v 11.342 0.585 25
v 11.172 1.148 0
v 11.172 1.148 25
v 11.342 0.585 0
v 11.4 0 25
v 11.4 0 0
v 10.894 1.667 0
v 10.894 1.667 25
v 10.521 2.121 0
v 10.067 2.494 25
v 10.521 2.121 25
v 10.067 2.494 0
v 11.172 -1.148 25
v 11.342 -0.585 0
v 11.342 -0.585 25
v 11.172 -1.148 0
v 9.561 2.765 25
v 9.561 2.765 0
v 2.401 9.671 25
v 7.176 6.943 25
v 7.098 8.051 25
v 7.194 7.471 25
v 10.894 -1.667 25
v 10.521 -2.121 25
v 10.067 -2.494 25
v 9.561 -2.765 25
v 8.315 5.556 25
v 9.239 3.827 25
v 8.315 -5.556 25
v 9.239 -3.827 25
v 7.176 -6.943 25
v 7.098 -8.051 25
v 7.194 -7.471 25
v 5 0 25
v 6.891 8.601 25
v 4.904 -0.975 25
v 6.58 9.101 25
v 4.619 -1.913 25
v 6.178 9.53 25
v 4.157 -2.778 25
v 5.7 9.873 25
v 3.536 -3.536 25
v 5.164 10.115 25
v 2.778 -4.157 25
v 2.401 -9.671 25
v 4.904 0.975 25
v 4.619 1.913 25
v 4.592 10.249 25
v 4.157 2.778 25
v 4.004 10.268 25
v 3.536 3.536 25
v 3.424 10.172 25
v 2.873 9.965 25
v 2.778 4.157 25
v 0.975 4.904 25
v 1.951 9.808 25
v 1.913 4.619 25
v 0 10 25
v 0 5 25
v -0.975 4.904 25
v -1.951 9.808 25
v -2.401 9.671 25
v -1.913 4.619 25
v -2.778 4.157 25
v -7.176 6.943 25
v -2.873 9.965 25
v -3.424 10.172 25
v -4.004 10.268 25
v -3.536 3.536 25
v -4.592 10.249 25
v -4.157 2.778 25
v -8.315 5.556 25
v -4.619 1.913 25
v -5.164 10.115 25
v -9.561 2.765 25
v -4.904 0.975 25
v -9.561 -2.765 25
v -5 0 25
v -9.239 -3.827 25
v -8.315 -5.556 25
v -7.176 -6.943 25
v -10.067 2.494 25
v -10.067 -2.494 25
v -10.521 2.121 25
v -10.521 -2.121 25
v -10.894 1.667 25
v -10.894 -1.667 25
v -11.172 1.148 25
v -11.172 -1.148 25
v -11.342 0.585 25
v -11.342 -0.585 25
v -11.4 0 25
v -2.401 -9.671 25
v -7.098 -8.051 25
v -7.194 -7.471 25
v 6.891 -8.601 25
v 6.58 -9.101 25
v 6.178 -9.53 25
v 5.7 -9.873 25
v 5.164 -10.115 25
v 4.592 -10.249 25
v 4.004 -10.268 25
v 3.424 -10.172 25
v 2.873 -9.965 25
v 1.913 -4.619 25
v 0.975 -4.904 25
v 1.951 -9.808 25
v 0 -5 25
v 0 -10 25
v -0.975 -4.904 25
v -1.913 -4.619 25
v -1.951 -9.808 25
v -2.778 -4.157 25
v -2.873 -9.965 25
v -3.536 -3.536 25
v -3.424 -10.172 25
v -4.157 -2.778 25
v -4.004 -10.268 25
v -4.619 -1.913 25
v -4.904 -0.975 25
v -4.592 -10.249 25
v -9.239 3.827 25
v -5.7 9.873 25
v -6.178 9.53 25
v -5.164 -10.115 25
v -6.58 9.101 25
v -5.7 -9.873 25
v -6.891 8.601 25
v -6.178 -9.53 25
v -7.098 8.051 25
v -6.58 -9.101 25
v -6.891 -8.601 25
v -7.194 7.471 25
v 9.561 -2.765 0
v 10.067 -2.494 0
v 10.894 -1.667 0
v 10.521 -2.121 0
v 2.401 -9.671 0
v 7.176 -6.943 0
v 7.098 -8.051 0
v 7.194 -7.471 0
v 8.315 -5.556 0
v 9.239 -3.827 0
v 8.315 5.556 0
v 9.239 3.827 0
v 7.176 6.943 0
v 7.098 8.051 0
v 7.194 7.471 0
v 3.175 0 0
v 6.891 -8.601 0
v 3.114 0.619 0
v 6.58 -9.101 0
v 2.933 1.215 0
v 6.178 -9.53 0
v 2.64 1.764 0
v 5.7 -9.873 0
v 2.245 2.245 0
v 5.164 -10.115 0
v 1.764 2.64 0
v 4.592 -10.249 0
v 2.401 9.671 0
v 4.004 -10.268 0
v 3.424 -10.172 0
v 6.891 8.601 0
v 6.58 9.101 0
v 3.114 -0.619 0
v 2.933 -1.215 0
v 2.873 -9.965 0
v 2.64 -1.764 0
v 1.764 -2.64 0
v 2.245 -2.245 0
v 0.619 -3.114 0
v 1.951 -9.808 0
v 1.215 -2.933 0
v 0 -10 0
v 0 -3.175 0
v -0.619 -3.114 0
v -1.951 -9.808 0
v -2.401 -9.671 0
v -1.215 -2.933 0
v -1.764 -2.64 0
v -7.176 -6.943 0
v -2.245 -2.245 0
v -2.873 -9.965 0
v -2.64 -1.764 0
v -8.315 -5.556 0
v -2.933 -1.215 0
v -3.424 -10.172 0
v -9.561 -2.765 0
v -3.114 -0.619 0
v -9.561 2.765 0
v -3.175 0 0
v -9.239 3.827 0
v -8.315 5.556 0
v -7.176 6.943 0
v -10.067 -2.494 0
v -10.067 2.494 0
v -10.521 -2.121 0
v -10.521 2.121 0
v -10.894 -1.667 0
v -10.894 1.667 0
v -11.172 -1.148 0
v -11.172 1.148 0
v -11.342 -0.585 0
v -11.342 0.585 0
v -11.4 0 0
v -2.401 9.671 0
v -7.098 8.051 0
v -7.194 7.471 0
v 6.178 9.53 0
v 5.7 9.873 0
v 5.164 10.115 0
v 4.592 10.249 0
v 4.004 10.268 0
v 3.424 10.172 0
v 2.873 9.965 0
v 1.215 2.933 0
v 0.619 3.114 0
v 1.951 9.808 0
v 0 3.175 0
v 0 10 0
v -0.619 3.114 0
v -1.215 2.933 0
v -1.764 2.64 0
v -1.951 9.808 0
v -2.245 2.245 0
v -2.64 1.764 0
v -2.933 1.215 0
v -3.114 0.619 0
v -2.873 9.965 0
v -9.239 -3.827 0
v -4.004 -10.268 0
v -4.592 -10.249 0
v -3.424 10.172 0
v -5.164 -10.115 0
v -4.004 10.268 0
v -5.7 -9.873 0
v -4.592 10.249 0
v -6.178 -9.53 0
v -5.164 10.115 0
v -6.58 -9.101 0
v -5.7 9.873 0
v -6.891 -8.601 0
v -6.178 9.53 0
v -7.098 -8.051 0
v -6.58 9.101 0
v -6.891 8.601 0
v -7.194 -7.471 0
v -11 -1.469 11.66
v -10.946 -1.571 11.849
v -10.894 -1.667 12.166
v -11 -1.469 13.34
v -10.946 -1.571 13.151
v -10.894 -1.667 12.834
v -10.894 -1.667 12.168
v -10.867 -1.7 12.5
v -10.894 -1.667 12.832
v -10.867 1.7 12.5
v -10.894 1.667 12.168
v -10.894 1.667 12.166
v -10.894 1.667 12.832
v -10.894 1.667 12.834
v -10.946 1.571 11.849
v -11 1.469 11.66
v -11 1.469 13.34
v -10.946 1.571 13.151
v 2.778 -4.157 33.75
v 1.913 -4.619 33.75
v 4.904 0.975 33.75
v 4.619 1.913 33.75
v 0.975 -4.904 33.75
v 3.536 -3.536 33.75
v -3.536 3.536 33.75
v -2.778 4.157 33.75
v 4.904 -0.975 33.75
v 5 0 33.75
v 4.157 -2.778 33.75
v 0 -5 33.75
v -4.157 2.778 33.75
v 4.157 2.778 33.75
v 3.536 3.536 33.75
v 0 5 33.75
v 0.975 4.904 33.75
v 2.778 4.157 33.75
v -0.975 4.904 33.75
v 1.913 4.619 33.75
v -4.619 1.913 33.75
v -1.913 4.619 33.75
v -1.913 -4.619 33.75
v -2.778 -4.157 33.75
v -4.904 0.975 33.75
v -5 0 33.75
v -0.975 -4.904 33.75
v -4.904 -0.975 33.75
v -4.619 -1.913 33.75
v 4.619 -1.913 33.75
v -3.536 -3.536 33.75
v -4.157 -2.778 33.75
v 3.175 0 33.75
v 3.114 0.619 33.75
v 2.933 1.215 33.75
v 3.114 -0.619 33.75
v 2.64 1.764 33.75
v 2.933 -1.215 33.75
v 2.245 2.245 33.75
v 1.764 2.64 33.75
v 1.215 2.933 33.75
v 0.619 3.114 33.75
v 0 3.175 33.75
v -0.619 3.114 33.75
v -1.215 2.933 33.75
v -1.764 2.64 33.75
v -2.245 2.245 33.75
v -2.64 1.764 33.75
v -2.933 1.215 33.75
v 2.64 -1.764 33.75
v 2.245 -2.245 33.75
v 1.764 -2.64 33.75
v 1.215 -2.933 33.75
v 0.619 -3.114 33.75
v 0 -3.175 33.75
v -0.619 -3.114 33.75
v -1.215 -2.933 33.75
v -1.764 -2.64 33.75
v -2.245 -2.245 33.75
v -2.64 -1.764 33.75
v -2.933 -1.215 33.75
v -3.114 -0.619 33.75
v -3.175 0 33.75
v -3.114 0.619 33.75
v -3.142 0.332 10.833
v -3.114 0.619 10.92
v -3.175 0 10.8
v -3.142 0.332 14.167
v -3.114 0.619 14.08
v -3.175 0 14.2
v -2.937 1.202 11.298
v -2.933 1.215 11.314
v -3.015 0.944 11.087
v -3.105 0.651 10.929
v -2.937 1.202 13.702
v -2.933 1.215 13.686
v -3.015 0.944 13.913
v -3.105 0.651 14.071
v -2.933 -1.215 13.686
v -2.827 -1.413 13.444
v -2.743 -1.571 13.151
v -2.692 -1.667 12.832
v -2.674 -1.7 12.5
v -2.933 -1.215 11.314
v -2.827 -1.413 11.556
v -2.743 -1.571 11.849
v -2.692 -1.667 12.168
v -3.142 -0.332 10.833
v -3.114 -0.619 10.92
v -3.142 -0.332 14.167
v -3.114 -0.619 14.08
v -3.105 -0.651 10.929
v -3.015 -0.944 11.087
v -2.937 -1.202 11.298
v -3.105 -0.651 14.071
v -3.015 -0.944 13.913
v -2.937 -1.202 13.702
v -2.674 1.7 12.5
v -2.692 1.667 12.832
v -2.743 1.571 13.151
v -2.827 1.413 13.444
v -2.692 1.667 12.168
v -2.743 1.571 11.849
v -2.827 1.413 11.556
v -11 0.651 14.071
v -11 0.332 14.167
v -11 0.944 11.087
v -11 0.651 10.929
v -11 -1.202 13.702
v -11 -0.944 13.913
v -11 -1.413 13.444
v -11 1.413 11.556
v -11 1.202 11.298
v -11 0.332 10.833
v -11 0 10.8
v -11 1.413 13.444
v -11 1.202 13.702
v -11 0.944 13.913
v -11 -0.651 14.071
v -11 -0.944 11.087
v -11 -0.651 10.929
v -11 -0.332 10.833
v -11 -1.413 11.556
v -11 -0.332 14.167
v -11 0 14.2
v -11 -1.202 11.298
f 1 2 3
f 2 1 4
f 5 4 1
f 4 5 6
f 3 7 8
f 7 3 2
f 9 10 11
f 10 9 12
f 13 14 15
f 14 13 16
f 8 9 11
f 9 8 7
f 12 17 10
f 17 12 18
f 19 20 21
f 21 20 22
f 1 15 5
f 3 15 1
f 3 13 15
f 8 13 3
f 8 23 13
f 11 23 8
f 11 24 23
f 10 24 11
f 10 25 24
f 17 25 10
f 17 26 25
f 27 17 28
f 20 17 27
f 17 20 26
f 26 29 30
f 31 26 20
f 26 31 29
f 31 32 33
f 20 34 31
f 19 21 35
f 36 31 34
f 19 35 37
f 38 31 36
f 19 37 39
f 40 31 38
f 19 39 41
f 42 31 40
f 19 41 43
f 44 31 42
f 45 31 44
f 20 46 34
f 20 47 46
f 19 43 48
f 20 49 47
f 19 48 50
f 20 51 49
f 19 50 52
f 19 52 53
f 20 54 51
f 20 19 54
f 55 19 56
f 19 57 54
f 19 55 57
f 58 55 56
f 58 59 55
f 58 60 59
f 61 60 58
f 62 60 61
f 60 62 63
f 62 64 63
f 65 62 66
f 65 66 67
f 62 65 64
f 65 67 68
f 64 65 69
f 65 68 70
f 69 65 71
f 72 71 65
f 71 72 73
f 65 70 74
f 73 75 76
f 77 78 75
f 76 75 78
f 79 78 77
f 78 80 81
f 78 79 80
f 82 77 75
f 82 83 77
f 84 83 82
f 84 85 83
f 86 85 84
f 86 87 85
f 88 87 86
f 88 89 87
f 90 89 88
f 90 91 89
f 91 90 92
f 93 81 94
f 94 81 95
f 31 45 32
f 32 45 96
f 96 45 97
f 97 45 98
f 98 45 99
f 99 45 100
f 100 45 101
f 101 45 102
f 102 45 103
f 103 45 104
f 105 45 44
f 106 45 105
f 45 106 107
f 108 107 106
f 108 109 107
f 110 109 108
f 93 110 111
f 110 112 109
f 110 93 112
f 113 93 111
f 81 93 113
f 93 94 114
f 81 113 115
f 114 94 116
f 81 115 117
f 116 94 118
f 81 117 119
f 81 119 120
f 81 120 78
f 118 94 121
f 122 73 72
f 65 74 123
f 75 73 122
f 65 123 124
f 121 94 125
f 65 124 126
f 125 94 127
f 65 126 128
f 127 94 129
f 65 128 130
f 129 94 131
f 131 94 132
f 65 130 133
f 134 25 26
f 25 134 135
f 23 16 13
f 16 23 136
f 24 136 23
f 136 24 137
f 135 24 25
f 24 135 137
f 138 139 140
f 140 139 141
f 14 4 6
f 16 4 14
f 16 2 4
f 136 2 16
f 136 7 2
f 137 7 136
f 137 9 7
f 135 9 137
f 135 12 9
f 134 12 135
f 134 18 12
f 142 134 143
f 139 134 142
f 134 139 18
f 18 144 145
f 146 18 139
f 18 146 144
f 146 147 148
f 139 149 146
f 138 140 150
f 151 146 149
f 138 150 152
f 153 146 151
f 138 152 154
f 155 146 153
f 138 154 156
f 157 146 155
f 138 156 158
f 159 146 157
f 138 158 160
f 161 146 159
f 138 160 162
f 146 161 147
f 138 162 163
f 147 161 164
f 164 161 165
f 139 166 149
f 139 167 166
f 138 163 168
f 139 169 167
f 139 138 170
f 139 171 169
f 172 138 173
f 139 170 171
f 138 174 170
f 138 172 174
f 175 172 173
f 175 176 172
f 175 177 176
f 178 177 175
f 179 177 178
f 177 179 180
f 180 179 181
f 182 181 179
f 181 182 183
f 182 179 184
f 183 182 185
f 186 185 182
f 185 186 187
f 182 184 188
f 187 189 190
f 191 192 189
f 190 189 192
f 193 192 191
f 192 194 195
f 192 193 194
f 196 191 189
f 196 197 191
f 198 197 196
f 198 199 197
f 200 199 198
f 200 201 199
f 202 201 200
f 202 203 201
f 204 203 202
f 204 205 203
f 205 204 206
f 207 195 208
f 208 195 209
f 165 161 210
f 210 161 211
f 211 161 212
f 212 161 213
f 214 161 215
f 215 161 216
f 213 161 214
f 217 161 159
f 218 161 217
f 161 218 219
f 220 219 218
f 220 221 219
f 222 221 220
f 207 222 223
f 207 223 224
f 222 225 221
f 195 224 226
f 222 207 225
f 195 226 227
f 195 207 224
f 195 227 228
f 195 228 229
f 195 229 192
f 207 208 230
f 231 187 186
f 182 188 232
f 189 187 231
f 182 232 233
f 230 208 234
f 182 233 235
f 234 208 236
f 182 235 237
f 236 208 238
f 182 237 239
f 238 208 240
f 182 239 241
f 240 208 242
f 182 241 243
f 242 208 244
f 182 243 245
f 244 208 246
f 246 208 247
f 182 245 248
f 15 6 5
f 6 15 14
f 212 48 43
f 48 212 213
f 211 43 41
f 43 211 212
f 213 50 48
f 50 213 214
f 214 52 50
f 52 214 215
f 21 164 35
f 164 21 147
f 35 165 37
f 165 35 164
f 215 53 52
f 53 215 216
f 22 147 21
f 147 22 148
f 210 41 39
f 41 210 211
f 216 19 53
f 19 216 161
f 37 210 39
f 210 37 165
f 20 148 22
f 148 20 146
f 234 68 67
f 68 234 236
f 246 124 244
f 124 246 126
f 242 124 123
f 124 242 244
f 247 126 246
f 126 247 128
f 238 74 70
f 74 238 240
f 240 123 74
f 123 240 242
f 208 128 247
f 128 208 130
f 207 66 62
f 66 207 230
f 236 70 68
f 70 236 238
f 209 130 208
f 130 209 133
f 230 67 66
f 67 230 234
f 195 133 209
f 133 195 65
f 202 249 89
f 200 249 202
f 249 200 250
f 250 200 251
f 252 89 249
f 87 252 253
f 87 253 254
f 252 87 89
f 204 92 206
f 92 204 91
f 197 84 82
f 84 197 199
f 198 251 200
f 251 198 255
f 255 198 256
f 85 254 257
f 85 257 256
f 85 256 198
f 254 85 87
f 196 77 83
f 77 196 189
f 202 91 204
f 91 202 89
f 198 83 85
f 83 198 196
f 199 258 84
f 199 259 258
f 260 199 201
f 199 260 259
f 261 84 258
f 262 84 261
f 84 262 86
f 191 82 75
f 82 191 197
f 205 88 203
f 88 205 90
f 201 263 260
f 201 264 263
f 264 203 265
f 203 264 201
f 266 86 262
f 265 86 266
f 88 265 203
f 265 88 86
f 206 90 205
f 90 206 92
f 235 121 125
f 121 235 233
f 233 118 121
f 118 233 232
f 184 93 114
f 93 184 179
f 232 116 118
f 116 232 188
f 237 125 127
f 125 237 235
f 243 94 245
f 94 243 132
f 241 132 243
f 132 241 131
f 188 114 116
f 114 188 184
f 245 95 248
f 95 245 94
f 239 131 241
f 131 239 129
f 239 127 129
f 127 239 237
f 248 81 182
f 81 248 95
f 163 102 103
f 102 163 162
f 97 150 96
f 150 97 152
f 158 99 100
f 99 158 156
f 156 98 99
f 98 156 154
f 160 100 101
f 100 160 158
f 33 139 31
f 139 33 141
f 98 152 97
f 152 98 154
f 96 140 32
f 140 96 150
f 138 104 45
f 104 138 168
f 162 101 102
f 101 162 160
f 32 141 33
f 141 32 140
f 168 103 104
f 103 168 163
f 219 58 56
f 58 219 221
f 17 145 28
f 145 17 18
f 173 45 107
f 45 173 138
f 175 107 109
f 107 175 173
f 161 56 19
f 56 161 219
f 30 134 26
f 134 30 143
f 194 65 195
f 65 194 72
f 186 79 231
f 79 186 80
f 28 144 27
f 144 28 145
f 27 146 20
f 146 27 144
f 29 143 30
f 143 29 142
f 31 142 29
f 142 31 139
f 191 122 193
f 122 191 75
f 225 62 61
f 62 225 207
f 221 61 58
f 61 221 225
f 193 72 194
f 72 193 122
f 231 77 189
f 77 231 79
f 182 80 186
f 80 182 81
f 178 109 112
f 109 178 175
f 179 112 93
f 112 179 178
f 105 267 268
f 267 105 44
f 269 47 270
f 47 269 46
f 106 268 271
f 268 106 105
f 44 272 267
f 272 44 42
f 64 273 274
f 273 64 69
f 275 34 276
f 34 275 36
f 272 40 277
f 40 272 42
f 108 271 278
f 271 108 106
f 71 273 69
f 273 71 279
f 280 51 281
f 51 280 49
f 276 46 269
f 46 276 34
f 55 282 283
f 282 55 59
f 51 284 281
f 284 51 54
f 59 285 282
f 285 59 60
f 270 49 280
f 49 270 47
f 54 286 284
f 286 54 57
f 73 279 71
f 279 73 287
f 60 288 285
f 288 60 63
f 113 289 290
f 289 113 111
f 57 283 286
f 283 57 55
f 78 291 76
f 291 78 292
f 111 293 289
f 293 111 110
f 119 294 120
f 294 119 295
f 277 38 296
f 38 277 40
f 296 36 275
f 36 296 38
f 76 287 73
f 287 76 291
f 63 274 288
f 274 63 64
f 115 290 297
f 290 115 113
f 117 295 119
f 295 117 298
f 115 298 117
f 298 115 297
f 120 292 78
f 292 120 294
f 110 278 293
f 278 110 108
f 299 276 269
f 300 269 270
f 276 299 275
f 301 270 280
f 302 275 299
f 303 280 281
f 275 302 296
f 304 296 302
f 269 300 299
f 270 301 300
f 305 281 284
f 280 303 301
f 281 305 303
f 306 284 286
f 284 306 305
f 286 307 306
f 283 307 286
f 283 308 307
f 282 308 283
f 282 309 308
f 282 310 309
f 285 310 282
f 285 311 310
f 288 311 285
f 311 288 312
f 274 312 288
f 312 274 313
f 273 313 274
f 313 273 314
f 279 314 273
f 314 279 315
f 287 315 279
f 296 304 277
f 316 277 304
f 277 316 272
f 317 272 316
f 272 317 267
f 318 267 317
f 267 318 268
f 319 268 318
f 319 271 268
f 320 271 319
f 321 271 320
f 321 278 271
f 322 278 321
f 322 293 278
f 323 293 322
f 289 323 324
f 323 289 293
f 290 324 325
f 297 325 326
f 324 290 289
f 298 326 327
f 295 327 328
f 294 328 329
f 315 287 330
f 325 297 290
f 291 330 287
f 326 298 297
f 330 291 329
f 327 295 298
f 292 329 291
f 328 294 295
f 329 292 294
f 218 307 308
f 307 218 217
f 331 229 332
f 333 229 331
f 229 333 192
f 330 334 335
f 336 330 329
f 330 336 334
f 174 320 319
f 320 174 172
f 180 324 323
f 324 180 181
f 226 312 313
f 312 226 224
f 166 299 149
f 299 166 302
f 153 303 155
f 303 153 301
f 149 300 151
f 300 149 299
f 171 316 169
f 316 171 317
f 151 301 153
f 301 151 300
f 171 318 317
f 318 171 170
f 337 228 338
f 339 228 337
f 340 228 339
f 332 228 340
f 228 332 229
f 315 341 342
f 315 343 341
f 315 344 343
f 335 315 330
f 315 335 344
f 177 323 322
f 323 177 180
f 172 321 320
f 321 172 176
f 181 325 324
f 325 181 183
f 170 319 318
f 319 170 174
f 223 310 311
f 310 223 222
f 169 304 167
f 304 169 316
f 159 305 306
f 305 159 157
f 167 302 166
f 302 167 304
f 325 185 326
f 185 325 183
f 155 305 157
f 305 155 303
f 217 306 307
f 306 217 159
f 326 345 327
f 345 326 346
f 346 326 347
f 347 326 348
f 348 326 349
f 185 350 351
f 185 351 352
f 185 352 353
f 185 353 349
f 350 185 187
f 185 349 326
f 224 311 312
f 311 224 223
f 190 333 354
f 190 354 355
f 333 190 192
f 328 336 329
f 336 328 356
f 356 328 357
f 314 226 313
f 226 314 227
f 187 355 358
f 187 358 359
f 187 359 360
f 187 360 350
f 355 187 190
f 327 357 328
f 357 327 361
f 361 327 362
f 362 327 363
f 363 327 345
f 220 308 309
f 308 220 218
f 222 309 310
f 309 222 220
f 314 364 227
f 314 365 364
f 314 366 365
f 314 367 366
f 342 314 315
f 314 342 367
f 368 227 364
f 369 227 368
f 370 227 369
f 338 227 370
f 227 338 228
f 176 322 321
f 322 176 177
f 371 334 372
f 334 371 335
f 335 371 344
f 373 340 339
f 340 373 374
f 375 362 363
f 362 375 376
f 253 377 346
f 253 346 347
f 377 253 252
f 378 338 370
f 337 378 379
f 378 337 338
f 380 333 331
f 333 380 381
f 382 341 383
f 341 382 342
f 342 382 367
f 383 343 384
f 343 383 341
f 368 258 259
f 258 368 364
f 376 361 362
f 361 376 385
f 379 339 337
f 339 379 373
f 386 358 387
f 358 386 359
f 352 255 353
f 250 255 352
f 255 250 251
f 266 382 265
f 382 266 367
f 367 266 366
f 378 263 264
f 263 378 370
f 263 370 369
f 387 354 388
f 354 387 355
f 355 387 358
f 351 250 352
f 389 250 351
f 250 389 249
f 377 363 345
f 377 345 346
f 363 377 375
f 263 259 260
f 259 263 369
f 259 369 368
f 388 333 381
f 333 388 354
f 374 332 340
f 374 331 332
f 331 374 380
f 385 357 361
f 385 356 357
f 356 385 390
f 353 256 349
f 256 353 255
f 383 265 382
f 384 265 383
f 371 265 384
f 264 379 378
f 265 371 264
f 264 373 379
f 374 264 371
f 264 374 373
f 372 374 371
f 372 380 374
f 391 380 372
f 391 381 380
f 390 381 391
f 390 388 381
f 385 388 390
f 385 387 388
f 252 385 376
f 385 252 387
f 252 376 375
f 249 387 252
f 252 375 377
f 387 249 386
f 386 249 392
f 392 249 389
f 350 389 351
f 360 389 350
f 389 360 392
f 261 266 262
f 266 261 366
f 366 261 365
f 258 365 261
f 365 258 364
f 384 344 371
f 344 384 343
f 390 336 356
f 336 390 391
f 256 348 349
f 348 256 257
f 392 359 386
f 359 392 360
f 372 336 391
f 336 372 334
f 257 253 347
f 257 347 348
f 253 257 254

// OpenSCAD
$fn = 32;

// ----------------------------------------------------------------------
// Hand knob: 20 x 20 x 33.75 mm
// ----------------------------------------------------------------------

// --- parameters (mm) ---
head_d = 20;              // knob diameter
head_h = 25;              // knob height
hole_d = 6.35;            // shaft bore
set_d = 3.4;              // set screw tap hole
notch_d = 0.43;           // knurl groove diameter
lobes = 6;                // grip lobes
cap_h = 8.75;             // raised centre cap
cap_d = 10;               // centre cap diameter

module body() {
  cylinder(h = head_h, d = head_d);
  for (i = [0 : lobes - 1])
    rotate([0, 0, i * 360 / lobes])
      translate([head_d * 0.42, 0, 0])
        cylinder(h = head_h, d = head_d * 0.3);
}

module cap() {
  translate([0, 0, head_h - 1]) cylinder(h = cap_h + 1, d = cap_d);
}

difference() {
  union() {
    body();
    cap();
  }
  translate([0, 0, -1]) cylinder(h = head_h + cap_h + 2, d = hole_d);
  translate([-head_d / 2 - 1, 0, head_h * 0.5]) rotate([0, 90, 0]) cylinder(h = head_d / 2 + 2, d = set_d);
}
